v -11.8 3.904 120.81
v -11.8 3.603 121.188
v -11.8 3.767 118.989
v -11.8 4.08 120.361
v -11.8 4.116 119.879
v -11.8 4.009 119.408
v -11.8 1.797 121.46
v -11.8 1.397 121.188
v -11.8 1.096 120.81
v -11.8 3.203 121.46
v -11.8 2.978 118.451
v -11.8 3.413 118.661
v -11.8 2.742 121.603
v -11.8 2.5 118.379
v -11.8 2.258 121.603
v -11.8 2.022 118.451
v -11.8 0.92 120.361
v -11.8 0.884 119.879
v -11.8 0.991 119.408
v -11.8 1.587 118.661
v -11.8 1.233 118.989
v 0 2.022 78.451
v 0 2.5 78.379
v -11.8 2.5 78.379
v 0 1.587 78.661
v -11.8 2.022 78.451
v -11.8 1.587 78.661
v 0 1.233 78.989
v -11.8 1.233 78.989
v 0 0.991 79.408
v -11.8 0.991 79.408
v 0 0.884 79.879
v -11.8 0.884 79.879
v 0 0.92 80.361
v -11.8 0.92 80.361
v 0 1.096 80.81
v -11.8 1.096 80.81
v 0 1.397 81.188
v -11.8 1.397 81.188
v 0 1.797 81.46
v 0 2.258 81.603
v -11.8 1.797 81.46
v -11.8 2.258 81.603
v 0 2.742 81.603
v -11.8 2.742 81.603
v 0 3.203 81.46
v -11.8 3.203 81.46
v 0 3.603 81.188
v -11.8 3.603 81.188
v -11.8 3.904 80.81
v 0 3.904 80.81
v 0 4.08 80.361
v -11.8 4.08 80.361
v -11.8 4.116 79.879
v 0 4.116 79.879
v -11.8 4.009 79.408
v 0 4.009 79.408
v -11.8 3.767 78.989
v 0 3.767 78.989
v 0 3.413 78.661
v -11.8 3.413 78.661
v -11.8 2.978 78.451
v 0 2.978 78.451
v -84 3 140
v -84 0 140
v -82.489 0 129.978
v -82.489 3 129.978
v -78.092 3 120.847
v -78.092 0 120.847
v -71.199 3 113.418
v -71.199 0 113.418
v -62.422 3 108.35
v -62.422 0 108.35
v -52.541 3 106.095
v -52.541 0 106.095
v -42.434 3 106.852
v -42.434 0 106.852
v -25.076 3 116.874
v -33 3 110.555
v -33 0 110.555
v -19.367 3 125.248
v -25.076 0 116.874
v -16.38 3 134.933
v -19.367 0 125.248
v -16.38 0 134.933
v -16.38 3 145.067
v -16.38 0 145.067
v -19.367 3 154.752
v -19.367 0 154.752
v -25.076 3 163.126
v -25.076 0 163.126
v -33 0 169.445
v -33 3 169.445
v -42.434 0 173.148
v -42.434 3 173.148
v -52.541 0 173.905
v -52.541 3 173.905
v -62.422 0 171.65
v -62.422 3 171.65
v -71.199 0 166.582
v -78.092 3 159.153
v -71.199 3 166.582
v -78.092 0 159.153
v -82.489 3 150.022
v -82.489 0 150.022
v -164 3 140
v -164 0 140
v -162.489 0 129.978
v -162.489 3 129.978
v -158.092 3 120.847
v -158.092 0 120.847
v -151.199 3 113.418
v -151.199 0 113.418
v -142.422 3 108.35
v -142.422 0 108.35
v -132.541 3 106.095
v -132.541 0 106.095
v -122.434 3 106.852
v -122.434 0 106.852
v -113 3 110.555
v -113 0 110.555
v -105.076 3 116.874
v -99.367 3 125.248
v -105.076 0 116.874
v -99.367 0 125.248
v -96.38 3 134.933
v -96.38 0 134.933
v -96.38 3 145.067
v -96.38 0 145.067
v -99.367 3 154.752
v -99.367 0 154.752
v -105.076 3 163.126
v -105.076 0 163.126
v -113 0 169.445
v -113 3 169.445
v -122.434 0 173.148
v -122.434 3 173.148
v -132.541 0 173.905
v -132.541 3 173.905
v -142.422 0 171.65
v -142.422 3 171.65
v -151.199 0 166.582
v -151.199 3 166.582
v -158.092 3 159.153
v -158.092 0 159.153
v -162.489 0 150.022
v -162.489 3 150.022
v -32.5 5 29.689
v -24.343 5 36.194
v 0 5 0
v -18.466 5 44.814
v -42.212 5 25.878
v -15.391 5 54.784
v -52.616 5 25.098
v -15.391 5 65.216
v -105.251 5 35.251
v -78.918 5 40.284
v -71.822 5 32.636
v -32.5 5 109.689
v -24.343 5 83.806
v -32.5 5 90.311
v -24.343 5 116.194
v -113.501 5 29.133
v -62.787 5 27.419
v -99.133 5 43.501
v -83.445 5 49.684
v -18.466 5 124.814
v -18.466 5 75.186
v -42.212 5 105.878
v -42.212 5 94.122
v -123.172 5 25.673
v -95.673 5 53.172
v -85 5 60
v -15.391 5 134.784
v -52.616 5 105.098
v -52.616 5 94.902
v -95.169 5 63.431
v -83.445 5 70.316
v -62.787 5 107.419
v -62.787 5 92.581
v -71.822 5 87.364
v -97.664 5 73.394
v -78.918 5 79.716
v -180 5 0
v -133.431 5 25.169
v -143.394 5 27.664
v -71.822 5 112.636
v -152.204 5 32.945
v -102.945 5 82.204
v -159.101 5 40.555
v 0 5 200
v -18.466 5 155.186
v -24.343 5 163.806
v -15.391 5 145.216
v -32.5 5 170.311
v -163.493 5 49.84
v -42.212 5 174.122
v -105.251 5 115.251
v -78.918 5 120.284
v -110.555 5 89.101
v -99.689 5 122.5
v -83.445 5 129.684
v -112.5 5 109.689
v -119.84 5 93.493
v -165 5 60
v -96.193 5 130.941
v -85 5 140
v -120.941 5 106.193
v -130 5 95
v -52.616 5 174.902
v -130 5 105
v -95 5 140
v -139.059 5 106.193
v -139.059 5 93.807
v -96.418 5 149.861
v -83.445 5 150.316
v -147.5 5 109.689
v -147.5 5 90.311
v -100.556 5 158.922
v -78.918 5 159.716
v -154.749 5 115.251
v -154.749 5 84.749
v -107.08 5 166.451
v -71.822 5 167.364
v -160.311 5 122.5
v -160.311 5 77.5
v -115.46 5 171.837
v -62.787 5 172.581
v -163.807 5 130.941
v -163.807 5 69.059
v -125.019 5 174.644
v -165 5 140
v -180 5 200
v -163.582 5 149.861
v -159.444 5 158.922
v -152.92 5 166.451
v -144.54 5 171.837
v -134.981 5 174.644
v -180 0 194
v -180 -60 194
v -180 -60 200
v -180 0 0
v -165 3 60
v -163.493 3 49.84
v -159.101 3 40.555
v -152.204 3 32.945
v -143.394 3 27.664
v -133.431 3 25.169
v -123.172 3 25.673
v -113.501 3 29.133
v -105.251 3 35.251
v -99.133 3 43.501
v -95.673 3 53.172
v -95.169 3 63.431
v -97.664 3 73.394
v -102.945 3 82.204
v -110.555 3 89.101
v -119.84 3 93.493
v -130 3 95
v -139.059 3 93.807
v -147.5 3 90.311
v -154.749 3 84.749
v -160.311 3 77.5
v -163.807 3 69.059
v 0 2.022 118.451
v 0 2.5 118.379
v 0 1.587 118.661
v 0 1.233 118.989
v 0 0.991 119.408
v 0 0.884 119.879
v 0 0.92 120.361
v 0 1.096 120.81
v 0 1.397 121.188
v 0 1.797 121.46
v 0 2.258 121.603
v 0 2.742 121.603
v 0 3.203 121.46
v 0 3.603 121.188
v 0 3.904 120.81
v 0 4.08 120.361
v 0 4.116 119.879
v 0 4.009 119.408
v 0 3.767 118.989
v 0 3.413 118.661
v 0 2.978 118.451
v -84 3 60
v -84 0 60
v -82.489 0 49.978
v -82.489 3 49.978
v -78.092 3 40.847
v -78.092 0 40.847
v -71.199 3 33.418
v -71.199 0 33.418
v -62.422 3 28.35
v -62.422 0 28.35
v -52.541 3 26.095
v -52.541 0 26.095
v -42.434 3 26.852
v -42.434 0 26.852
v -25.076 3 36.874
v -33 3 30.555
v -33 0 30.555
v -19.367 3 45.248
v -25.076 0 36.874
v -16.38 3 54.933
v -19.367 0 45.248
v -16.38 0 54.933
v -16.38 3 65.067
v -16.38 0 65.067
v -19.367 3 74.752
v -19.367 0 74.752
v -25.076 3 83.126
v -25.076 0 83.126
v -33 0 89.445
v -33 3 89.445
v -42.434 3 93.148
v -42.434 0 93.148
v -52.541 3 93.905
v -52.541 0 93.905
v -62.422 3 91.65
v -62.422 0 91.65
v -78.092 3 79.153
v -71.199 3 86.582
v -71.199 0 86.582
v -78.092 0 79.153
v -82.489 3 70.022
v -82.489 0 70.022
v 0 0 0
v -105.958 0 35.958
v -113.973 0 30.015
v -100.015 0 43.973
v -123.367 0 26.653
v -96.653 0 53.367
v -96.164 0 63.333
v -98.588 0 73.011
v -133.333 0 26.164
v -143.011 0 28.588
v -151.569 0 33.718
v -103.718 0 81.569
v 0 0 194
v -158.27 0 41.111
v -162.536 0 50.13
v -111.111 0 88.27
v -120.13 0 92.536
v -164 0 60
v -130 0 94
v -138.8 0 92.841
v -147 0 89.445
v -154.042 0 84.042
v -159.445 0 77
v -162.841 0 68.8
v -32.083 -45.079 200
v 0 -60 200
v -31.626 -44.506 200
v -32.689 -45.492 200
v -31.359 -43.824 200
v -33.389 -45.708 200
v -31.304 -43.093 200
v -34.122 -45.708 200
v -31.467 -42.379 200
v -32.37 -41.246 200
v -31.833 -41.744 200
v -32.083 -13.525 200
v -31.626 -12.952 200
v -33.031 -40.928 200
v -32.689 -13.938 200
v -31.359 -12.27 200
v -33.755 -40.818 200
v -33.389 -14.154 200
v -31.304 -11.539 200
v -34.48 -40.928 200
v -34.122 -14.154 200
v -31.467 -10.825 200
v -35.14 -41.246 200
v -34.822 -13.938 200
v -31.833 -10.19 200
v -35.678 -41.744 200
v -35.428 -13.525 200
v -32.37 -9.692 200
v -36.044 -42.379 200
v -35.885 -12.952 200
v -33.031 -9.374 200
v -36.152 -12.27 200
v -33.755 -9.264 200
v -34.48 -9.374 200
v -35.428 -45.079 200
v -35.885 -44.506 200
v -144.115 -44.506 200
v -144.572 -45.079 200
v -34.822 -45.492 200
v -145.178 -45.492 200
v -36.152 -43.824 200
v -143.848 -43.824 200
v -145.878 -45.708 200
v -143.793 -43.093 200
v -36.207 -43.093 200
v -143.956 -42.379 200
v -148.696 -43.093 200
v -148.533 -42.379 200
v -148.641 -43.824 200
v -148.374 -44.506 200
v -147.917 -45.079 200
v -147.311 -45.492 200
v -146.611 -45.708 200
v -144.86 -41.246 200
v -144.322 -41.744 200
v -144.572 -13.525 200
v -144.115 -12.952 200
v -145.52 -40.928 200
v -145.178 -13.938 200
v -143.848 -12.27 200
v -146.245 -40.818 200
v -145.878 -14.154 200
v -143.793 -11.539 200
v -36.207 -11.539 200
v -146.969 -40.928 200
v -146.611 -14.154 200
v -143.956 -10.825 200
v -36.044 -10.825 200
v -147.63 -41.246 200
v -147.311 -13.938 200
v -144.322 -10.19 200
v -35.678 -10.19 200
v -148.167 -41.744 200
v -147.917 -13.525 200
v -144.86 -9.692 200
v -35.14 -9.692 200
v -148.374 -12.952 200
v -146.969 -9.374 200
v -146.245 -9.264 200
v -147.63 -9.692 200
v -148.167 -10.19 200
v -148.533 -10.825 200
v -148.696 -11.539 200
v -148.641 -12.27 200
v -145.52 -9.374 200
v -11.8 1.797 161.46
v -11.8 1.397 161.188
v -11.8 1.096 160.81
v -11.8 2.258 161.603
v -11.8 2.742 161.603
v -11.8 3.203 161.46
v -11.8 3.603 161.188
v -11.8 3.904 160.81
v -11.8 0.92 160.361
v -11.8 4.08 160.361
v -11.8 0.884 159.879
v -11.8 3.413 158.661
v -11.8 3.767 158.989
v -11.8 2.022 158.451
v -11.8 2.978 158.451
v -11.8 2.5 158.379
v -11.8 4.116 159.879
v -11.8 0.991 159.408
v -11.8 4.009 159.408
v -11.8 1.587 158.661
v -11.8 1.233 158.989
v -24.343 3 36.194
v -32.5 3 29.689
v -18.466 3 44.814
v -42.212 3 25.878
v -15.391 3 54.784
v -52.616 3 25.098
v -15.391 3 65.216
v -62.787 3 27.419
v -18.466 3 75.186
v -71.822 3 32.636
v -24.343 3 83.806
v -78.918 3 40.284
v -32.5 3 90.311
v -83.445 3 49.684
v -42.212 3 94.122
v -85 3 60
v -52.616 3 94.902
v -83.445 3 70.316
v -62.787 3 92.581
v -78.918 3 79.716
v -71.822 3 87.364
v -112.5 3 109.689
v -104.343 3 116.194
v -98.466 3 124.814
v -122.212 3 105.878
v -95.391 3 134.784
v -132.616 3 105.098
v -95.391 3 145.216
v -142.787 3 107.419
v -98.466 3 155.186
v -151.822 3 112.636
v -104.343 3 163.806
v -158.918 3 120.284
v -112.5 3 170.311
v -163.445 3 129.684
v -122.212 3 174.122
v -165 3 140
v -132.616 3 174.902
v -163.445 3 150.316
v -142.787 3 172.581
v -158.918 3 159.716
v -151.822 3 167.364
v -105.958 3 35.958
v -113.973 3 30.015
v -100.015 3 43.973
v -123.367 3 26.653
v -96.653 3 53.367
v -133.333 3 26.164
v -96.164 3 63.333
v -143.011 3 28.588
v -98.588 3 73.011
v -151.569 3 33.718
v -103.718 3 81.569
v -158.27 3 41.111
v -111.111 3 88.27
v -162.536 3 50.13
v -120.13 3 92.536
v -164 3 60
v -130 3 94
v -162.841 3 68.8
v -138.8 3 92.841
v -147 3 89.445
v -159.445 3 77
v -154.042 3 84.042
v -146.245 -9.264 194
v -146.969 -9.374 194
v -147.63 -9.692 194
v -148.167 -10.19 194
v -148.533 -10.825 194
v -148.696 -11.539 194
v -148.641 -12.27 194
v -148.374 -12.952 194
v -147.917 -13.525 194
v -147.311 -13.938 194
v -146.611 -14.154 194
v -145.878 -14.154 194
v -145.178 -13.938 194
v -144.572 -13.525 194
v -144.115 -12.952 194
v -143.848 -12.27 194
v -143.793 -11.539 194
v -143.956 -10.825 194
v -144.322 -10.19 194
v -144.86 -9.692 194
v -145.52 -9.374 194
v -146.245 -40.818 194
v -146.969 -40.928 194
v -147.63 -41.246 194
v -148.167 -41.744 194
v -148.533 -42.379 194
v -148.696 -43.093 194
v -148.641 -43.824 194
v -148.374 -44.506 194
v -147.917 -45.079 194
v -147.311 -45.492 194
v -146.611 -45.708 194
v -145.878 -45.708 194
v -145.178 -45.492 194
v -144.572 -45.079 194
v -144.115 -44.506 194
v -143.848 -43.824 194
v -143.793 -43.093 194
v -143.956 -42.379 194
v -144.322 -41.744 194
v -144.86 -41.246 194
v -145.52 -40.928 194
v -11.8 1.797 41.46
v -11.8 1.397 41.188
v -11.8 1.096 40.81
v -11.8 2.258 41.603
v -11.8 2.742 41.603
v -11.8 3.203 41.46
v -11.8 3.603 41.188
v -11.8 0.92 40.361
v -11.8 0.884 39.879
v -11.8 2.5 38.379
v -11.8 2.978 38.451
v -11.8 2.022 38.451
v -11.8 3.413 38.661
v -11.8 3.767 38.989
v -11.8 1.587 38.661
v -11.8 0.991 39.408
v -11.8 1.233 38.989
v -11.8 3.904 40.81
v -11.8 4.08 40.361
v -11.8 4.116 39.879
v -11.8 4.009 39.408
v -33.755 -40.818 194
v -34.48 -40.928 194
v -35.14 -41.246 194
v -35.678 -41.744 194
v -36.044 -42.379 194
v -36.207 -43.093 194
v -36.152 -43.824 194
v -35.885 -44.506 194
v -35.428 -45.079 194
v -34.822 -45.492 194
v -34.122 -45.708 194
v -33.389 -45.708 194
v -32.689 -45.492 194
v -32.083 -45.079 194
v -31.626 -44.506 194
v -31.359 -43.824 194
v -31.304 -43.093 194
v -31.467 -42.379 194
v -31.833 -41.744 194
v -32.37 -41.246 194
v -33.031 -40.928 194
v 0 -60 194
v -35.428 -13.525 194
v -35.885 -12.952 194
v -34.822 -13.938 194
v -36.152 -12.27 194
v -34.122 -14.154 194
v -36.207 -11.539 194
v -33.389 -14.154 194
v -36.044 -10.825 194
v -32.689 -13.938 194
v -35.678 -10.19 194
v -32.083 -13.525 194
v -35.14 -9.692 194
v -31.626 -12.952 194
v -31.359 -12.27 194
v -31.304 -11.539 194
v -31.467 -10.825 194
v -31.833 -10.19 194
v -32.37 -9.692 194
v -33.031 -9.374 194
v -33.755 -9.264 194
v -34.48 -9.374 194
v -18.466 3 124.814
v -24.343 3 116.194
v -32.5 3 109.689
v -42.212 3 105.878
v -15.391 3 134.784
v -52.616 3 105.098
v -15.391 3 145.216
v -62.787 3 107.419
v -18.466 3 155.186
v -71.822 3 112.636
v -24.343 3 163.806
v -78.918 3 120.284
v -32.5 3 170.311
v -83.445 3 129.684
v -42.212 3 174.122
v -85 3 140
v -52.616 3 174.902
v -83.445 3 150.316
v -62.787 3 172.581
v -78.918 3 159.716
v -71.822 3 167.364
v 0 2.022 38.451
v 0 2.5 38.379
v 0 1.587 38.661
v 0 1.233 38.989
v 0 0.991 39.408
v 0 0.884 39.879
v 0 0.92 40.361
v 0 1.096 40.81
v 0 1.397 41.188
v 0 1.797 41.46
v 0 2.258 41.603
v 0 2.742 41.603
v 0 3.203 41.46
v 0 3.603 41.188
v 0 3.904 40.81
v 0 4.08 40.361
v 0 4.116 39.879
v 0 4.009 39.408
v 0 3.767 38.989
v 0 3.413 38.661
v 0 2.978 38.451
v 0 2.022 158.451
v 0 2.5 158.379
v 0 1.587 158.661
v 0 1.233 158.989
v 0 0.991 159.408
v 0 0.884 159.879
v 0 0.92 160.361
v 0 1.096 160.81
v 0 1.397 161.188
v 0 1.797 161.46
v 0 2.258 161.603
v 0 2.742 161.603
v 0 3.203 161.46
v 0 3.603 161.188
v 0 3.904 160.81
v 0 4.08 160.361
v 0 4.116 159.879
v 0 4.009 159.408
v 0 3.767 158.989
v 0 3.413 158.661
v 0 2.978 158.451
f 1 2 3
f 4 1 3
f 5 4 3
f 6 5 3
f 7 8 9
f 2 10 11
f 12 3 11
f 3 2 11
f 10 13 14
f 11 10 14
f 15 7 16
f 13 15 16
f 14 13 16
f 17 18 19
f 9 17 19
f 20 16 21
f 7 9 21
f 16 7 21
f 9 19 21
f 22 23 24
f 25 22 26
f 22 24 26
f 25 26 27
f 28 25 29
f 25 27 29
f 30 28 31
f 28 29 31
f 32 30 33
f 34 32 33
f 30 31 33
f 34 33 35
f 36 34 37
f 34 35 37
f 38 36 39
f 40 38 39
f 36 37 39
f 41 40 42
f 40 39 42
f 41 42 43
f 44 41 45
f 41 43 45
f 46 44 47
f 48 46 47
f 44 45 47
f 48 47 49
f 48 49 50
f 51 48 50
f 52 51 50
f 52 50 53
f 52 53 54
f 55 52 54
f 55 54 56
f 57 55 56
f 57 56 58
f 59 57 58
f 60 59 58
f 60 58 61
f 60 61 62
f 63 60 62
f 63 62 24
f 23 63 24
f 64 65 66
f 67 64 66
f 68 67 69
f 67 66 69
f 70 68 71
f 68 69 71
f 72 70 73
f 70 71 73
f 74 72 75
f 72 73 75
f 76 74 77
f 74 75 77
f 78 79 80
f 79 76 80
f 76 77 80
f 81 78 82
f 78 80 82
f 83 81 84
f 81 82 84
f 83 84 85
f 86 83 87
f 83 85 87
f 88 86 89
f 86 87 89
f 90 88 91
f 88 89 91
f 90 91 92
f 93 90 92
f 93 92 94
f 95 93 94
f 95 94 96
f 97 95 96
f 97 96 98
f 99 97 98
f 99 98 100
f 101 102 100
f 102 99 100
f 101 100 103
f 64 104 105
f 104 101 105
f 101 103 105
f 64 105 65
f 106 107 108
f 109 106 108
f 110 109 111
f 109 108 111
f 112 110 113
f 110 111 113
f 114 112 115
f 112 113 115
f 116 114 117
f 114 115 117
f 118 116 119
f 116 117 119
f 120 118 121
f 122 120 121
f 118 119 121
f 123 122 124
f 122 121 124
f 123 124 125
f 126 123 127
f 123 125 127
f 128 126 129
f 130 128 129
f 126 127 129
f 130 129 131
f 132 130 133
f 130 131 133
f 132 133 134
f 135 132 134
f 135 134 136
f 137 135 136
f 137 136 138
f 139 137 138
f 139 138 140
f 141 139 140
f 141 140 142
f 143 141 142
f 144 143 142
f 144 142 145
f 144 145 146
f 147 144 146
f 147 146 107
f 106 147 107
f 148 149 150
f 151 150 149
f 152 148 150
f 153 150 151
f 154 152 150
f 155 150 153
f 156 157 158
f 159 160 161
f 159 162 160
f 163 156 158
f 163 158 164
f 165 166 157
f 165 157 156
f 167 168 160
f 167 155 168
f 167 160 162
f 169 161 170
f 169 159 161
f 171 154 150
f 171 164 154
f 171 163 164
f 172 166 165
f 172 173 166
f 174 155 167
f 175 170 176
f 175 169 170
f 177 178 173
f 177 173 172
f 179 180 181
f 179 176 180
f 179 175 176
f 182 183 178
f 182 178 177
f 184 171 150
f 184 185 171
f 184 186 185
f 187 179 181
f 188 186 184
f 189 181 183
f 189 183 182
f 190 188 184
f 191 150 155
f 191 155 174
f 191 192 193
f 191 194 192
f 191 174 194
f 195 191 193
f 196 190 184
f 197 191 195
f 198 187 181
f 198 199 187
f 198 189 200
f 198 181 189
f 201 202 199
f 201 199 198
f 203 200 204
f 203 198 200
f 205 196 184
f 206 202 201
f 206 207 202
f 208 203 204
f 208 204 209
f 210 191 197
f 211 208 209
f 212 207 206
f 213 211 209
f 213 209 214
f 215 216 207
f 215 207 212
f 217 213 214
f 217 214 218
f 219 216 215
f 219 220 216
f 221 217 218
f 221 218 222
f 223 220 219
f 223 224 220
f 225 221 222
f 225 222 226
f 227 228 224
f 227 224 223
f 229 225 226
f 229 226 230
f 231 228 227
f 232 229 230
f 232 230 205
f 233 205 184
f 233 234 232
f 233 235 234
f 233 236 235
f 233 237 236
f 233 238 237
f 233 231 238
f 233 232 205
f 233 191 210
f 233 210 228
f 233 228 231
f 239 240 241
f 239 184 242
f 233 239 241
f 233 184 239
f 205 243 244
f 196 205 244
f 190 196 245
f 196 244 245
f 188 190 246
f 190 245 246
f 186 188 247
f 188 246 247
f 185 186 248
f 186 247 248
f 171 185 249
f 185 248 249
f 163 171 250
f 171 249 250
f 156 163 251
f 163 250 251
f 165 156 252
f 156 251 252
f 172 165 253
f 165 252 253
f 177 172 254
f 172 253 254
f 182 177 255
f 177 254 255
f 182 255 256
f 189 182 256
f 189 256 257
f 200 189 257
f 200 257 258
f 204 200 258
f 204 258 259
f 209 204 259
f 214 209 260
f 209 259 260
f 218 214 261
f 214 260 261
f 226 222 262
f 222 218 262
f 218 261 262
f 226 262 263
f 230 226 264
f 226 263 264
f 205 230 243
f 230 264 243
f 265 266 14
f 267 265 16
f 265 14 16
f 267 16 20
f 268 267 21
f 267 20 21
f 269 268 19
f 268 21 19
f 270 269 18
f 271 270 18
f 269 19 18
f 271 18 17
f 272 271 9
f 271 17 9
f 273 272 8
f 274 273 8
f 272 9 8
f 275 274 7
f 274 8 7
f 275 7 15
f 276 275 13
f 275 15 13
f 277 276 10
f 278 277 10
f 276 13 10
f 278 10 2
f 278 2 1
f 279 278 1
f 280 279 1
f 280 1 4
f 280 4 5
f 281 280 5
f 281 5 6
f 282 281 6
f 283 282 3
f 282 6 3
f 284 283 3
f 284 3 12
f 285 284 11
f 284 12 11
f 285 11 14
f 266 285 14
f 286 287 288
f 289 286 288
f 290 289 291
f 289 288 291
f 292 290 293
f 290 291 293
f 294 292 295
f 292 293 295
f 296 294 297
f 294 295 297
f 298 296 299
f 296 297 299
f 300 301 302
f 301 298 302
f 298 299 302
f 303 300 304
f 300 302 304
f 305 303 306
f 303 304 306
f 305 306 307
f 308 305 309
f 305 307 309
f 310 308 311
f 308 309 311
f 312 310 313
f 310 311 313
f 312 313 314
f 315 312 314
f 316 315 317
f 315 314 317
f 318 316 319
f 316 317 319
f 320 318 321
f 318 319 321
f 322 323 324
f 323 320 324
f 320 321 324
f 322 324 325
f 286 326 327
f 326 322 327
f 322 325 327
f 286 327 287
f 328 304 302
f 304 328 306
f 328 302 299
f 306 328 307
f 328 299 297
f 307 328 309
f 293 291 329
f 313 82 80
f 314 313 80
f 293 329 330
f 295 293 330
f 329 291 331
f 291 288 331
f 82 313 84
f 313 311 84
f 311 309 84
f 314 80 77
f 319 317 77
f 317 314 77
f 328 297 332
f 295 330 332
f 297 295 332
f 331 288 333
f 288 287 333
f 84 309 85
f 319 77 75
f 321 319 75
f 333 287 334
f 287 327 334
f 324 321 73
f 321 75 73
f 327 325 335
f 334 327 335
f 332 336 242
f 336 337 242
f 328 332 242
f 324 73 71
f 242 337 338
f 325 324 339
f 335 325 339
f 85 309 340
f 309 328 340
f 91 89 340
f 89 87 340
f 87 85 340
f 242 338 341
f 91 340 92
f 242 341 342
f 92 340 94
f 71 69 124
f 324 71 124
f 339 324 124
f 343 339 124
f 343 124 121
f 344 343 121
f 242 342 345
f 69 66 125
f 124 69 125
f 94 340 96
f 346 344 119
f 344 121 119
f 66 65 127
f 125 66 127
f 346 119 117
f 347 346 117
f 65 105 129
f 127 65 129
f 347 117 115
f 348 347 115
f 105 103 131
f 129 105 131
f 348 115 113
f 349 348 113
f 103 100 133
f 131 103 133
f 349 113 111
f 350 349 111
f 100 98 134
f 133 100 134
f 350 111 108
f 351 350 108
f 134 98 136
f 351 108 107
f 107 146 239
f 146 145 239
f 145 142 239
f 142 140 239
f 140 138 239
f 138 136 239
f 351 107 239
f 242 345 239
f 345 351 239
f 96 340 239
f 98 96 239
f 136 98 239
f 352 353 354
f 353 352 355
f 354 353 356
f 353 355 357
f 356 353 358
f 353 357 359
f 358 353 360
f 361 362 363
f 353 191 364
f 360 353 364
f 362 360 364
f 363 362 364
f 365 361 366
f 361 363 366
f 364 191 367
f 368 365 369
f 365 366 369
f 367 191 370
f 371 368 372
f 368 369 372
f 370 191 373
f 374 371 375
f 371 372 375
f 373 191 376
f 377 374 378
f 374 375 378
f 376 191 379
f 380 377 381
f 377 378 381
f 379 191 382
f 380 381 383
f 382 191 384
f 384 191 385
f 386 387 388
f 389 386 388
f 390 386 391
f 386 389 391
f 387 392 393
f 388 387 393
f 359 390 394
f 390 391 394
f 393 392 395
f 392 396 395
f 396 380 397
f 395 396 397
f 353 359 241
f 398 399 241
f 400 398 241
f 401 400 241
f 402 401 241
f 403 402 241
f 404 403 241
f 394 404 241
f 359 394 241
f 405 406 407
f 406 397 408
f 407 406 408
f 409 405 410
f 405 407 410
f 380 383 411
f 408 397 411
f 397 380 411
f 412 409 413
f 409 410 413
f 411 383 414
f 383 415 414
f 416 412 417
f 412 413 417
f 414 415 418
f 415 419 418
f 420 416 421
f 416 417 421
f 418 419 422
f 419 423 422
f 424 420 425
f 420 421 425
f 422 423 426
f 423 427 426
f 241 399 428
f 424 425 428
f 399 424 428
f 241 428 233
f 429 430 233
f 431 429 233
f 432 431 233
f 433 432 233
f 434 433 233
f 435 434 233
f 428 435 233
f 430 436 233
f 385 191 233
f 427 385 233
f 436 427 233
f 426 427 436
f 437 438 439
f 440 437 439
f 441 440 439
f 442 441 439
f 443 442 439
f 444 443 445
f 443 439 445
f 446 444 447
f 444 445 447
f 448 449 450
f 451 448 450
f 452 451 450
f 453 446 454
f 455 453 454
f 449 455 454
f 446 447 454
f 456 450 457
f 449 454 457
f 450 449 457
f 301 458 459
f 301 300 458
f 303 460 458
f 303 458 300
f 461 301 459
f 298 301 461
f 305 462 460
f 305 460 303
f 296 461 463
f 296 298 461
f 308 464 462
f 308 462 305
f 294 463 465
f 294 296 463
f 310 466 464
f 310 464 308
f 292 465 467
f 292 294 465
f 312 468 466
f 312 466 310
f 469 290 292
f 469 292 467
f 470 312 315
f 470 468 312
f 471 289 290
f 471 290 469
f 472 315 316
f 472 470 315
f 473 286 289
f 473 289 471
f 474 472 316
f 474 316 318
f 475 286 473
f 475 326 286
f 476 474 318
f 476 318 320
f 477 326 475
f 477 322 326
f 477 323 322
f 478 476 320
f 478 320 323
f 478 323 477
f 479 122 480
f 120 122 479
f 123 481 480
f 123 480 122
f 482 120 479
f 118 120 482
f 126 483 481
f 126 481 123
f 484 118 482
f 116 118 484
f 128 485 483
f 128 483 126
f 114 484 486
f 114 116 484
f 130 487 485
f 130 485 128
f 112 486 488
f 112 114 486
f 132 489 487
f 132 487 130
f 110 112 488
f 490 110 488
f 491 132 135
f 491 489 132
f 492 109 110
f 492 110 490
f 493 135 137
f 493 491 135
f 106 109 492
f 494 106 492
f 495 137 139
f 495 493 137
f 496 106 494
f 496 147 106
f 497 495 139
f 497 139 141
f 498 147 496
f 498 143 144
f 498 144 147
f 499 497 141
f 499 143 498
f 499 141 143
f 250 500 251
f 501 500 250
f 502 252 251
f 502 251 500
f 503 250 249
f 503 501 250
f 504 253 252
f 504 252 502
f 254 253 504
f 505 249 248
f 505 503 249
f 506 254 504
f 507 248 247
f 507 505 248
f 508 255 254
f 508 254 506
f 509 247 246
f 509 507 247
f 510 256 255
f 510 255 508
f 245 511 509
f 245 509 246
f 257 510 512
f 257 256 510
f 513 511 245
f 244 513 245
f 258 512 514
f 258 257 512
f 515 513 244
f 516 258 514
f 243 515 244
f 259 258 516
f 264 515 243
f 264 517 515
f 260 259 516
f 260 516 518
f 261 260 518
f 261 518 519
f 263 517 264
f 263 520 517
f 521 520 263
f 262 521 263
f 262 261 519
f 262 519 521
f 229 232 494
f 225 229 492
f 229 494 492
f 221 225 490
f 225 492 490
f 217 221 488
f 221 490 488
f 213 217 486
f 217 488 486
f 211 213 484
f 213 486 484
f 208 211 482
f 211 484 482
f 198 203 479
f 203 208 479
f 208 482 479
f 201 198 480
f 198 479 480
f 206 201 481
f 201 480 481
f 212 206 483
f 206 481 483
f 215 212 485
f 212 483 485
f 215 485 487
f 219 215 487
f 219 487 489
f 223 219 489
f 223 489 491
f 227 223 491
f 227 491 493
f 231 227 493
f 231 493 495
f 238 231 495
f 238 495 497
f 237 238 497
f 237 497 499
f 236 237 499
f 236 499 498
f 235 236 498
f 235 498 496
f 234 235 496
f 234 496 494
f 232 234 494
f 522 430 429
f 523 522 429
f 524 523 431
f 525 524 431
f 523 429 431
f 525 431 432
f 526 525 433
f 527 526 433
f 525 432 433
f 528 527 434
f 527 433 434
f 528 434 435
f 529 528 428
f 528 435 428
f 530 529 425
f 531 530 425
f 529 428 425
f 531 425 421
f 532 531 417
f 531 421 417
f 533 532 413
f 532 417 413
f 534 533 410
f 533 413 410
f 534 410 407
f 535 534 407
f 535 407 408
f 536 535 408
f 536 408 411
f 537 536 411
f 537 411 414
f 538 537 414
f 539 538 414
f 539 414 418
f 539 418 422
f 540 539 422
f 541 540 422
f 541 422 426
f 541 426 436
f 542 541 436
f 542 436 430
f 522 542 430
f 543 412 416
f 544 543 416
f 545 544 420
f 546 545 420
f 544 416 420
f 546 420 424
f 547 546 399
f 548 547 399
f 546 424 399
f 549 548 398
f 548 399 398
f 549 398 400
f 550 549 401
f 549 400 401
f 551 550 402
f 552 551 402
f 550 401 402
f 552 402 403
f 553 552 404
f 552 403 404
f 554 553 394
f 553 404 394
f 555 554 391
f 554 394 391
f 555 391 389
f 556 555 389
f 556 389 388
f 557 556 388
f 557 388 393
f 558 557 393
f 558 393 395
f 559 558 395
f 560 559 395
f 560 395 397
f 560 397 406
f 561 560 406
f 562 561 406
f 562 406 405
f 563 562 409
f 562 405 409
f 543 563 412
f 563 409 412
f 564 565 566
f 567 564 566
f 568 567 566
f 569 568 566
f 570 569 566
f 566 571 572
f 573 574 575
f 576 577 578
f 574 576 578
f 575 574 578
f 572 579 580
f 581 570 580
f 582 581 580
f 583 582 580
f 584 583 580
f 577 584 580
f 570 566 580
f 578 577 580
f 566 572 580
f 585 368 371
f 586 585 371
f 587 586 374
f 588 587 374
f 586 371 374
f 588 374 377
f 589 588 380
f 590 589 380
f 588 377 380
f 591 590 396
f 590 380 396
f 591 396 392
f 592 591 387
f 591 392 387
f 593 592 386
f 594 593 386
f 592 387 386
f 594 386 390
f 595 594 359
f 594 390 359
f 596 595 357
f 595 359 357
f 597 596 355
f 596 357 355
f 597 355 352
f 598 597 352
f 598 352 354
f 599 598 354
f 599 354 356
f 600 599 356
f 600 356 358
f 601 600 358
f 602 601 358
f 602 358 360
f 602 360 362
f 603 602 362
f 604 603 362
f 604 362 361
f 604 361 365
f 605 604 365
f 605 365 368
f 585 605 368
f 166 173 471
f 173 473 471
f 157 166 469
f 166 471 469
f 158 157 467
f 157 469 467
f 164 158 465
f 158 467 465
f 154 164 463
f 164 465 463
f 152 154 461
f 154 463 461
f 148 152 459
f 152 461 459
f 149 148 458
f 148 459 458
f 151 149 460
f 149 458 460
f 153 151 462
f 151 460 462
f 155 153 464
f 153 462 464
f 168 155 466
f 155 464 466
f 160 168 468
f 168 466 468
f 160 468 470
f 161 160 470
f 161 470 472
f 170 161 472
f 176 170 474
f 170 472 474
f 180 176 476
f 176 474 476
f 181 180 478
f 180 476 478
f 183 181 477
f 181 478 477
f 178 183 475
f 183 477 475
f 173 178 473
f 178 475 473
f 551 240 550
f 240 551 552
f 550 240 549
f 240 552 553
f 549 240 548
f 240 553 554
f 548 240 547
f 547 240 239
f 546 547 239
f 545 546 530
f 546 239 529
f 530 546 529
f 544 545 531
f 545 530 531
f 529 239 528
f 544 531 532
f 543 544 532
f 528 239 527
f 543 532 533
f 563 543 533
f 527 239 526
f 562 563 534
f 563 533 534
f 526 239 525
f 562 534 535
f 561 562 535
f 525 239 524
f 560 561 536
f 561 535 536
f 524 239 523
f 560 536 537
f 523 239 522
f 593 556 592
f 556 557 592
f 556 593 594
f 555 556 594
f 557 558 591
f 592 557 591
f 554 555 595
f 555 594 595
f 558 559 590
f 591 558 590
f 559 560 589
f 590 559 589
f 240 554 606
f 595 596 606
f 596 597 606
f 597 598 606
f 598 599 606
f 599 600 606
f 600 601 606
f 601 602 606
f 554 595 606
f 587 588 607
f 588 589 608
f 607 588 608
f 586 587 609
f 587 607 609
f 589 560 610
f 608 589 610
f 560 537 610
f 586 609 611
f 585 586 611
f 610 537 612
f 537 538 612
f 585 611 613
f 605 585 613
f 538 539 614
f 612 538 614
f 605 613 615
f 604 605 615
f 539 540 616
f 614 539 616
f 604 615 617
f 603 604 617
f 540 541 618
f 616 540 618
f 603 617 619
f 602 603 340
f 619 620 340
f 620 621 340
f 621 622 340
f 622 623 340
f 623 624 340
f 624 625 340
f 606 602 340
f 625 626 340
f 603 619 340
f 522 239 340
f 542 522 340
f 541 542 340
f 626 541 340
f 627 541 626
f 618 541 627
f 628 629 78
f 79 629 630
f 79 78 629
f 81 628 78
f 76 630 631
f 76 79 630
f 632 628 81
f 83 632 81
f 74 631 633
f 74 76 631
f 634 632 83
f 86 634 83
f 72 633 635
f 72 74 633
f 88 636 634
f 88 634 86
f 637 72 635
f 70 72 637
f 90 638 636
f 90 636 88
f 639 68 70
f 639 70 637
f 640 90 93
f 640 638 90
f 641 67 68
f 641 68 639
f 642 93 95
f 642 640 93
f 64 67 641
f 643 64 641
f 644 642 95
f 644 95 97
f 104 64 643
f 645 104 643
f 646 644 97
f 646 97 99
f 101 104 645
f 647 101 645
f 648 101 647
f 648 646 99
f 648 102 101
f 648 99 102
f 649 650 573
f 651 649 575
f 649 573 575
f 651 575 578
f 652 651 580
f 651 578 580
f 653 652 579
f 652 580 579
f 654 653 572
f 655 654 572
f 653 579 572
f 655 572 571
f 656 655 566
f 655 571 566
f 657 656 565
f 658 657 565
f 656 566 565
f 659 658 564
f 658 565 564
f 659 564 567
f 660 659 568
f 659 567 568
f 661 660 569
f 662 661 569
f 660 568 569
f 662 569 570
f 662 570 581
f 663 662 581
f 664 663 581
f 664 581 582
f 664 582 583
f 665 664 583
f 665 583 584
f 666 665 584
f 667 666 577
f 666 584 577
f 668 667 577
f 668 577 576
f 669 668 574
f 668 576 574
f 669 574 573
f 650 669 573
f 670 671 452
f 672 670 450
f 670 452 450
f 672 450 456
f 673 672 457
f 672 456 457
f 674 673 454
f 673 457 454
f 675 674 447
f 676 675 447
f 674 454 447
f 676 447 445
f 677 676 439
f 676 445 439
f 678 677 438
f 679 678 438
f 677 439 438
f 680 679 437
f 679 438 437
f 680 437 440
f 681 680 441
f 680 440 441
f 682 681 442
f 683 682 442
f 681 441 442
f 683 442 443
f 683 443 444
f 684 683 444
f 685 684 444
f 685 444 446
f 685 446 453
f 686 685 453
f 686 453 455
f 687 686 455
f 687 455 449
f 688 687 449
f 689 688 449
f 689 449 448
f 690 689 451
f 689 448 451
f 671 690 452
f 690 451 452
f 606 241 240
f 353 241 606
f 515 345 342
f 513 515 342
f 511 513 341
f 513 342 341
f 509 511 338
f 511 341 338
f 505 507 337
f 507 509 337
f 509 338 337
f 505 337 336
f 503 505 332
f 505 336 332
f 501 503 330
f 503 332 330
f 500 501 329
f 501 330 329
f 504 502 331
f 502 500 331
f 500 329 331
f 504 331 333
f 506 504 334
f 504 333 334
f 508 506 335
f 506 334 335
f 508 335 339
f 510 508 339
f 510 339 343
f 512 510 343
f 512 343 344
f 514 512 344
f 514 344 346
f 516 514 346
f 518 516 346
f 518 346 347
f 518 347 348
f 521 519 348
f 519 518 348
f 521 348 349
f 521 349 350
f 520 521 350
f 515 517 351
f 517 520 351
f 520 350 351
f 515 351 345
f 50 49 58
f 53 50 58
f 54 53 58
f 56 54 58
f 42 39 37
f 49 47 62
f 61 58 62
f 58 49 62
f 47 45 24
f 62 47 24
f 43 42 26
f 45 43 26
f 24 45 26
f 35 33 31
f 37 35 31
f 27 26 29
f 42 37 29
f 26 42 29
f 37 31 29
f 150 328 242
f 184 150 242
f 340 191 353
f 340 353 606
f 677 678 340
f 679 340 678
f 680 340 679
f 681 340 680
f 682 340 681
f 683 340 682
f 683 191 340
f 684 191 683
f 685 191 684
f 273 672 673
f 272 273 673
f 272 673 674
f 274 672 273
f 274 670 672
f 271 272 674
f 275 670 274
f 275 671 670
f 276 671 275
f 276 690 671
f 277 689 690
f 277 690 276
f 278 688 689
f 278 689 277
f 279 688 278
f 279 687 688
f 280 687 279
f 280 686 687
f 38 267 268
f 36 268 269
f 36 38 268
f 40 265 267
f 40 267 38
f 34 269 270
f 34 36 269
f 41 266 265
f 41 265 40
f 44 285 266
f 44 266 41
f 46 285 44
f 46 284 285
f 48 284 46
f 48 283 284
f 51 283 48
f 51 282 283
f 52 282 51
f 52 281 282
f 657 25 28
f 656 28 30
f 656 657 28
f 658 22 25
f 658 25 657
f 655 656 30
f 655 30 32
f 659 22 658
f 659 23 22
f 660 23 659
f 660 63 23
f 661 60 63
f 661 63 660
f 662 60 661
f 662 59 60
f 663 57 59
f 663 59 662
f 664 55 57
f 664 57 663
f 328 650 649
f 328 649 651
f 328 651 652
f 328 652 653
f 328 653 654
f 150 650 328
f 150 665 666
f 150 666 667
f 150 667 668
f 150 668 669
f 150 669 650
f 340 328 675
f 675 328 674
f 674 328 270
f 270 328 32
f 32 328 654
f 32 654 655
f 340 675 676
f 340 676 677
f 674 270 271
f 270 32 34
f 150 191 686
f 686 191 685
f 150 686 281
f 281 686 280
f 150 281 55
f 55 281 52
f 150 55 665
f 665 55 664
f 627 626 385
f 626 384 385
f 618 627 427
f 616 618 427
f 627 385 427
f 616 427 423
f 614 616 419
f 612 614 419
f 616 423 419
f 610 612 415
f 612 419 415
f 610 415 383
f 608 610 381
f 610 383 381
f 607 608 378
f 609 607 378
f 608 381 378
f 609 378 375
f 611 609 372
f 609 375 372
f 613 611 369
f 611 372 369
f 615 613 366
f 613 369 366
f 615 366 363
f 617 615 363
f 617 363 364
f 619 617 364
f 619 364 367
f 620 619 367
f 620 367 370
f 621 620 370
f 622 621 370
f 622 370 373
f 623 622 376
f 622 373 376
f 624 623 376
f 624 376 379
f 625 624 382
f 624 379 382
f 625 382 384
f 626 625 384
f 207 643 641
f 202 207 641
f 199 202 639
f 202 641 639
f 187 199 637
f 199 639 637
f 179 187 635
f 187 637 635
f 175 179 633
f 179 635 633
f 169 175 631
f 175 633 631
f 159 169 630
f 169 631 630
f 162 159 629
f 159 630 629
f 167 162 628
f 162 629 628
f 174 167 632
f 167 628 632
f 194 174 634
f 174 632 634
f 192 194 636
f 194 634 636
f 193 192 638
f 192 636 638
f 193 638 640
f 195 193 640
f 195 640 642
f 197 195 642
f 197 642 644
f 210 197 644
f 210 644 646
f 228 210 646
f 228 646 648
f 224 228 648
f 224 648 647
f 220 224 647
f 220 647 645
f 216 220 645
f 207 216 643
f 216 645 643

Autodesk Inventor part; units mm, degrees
ref_plane "YZ Plane" through (0, 0, 0) normal (1, 0, 0) x (0, 1, 0)
ref_plane "XZ Plane" through (0, 0, 0) normal (0, 1, 0) x (-1, 0, 0)
ref_plane "XY Plane" through (0, 0, 0) normal (0, 0, 1) x (1, 0, 0)
sketch "Sketch1" plane through (0, 0, 0) normal (0, 1, 0) x (-1, 0, 0)
  line L0 (0, 0) -> (180, 0)
  line L1 (180, 0) -> (180, 200)
  line L2 (180, 200) -> (0, 200)
  line L3 (0, 200) -> (0, 0)
  circle A0 centre (130, 140) radius 35
  circle A1 centre (130, 60) radius 35
  circle A2 centre (50, 140) radius 35
  circle A3 centre (50, 60) radius 35
  line L4 (130, 140) -> (50, 140)
  line L5 (130, 140) -> (130, 60)
  circle A4 centre (130, 140) radius 34
  circle A5 centre (130, 60) radius 34
  circle A6 centre (50, 140) radius 34
  circle A7 centre (50, 60) radius 34
  point P0 (90, 140)
  point P1 (90, 200)
  point P2 (130, 100)
  point P3 (180, 100)
  dimension "d0" = 180
  dimension "d1" = 200
  dimension "d2" = 70
  dimension "d3" = 70
  dimension "d4" = 70
  dimension "d5" = 70
  dimension "d6" = 10
  dimension "d7" = 10
  dimension "d11" = 68
  dimension "d12" = 68
  dimension "d13" = 68
  dimension "d14" = 68
extrude "Extrusion1" add sketch "Sketch1" along normal blind 5 contours L3 L2 L1 L0
extrude "Extrusion2" add sketch "Sketch1" along normal blind 3 contours A0 L5 A4 L4 | A1 | A2 | L4 A4 L5 A0 | A3
sketch "Sketch2" plane through (0, 0, 200) normal (1, 0, 0) x (0, 0, -1)
  circle A0 centre (40, 2.5) radius 1
  circle A1 centre (80, 2.5) radius 1
  circle A2 centre (120, 2.5) radius 1
  circle A3 centre (160, 2.5) radius 1
  line L0 (0, 0) -> (0, 5) projected
  line L1 (200, 0) -> (200, 5) projected
  line L2 (0, 5) -> (200, 5) projected
  dimension "d18" = 2
  dimension "d19" = 2
  dimension "d20" = 2
  dimension "d21" = 2
  dimension "d23" = 40
  dimension "d24" = 40
  dimension "d25" = 40
  dimension "d26" = 40
  dimension "d45" = 2.5
hole "Hole1" at (0, 2.5, 40) at (0, 2.5, 80) at (0, 2.5, 120) at (0, 2.5, 160) direction (-1, 0, 0) diameter 3.242 depth 11.8 thread size "M4x0.7" class "6H" standard "ANSI Metric M Profile"
sketch "Sketch3" plane through (0, 0, 0) normal (0, -1, 0) x (1, 0, 0)
  line L0 (0, 200) -> (0, 0) projected
  line L1 (-180, 0) -> (-180, 200) projected
  line L2 (0, 200) -> (-180, 200)
  line L3 (-180, 200) -> (-180, 194)
  line L4 (-180, 194) -> (0, 194)
  line L5 (0, 194) -> (0, 200)
  dimension "d35" = 6
extrude "Extrusion3" add sketch "Sketch3" along normal blind 60
sketch "Sketch4" plane through (0, 0, 194) normal (0, 0, -1) x (-1, 0, 0)
  circle A0 centre (33.7554, -11.723) radius 5.5293
  circle A1 centre (33.7554, -43.277) radius 5.535
  circle A2 centre (146.2446, -11.723) radius 5.926
  circle A3 centre (146.2446, -43.277) radius 6.0534
  line L0 (33.7554, -11.723) -> (33.7554, -43.277)
  line L1 (33.7554, -11.723) -> (146.2446, -11.723)
  line L2 (0, 0) -> (180, 0) projected
  line L3 (0, -60) -> (0, 5) projected
  point P0 (90, -11.723)
  point P1 (90, 0)
  point P2 (33.7554, -27.5)
  point P3 (0, -27.5)
hole "Hole2" at (-33.7554, -11.723, 194) at (-33.7554, -43.277, 194) at (-146.2446, -11.723, 194) at (-146.2446, -43.277, 194) direction (0, 0, 1) diameter 4.917 depth 17.1 thread size "M6x1" class "6H" standard "ANSI Metric M Profile"
properties part number "LensHolder"
